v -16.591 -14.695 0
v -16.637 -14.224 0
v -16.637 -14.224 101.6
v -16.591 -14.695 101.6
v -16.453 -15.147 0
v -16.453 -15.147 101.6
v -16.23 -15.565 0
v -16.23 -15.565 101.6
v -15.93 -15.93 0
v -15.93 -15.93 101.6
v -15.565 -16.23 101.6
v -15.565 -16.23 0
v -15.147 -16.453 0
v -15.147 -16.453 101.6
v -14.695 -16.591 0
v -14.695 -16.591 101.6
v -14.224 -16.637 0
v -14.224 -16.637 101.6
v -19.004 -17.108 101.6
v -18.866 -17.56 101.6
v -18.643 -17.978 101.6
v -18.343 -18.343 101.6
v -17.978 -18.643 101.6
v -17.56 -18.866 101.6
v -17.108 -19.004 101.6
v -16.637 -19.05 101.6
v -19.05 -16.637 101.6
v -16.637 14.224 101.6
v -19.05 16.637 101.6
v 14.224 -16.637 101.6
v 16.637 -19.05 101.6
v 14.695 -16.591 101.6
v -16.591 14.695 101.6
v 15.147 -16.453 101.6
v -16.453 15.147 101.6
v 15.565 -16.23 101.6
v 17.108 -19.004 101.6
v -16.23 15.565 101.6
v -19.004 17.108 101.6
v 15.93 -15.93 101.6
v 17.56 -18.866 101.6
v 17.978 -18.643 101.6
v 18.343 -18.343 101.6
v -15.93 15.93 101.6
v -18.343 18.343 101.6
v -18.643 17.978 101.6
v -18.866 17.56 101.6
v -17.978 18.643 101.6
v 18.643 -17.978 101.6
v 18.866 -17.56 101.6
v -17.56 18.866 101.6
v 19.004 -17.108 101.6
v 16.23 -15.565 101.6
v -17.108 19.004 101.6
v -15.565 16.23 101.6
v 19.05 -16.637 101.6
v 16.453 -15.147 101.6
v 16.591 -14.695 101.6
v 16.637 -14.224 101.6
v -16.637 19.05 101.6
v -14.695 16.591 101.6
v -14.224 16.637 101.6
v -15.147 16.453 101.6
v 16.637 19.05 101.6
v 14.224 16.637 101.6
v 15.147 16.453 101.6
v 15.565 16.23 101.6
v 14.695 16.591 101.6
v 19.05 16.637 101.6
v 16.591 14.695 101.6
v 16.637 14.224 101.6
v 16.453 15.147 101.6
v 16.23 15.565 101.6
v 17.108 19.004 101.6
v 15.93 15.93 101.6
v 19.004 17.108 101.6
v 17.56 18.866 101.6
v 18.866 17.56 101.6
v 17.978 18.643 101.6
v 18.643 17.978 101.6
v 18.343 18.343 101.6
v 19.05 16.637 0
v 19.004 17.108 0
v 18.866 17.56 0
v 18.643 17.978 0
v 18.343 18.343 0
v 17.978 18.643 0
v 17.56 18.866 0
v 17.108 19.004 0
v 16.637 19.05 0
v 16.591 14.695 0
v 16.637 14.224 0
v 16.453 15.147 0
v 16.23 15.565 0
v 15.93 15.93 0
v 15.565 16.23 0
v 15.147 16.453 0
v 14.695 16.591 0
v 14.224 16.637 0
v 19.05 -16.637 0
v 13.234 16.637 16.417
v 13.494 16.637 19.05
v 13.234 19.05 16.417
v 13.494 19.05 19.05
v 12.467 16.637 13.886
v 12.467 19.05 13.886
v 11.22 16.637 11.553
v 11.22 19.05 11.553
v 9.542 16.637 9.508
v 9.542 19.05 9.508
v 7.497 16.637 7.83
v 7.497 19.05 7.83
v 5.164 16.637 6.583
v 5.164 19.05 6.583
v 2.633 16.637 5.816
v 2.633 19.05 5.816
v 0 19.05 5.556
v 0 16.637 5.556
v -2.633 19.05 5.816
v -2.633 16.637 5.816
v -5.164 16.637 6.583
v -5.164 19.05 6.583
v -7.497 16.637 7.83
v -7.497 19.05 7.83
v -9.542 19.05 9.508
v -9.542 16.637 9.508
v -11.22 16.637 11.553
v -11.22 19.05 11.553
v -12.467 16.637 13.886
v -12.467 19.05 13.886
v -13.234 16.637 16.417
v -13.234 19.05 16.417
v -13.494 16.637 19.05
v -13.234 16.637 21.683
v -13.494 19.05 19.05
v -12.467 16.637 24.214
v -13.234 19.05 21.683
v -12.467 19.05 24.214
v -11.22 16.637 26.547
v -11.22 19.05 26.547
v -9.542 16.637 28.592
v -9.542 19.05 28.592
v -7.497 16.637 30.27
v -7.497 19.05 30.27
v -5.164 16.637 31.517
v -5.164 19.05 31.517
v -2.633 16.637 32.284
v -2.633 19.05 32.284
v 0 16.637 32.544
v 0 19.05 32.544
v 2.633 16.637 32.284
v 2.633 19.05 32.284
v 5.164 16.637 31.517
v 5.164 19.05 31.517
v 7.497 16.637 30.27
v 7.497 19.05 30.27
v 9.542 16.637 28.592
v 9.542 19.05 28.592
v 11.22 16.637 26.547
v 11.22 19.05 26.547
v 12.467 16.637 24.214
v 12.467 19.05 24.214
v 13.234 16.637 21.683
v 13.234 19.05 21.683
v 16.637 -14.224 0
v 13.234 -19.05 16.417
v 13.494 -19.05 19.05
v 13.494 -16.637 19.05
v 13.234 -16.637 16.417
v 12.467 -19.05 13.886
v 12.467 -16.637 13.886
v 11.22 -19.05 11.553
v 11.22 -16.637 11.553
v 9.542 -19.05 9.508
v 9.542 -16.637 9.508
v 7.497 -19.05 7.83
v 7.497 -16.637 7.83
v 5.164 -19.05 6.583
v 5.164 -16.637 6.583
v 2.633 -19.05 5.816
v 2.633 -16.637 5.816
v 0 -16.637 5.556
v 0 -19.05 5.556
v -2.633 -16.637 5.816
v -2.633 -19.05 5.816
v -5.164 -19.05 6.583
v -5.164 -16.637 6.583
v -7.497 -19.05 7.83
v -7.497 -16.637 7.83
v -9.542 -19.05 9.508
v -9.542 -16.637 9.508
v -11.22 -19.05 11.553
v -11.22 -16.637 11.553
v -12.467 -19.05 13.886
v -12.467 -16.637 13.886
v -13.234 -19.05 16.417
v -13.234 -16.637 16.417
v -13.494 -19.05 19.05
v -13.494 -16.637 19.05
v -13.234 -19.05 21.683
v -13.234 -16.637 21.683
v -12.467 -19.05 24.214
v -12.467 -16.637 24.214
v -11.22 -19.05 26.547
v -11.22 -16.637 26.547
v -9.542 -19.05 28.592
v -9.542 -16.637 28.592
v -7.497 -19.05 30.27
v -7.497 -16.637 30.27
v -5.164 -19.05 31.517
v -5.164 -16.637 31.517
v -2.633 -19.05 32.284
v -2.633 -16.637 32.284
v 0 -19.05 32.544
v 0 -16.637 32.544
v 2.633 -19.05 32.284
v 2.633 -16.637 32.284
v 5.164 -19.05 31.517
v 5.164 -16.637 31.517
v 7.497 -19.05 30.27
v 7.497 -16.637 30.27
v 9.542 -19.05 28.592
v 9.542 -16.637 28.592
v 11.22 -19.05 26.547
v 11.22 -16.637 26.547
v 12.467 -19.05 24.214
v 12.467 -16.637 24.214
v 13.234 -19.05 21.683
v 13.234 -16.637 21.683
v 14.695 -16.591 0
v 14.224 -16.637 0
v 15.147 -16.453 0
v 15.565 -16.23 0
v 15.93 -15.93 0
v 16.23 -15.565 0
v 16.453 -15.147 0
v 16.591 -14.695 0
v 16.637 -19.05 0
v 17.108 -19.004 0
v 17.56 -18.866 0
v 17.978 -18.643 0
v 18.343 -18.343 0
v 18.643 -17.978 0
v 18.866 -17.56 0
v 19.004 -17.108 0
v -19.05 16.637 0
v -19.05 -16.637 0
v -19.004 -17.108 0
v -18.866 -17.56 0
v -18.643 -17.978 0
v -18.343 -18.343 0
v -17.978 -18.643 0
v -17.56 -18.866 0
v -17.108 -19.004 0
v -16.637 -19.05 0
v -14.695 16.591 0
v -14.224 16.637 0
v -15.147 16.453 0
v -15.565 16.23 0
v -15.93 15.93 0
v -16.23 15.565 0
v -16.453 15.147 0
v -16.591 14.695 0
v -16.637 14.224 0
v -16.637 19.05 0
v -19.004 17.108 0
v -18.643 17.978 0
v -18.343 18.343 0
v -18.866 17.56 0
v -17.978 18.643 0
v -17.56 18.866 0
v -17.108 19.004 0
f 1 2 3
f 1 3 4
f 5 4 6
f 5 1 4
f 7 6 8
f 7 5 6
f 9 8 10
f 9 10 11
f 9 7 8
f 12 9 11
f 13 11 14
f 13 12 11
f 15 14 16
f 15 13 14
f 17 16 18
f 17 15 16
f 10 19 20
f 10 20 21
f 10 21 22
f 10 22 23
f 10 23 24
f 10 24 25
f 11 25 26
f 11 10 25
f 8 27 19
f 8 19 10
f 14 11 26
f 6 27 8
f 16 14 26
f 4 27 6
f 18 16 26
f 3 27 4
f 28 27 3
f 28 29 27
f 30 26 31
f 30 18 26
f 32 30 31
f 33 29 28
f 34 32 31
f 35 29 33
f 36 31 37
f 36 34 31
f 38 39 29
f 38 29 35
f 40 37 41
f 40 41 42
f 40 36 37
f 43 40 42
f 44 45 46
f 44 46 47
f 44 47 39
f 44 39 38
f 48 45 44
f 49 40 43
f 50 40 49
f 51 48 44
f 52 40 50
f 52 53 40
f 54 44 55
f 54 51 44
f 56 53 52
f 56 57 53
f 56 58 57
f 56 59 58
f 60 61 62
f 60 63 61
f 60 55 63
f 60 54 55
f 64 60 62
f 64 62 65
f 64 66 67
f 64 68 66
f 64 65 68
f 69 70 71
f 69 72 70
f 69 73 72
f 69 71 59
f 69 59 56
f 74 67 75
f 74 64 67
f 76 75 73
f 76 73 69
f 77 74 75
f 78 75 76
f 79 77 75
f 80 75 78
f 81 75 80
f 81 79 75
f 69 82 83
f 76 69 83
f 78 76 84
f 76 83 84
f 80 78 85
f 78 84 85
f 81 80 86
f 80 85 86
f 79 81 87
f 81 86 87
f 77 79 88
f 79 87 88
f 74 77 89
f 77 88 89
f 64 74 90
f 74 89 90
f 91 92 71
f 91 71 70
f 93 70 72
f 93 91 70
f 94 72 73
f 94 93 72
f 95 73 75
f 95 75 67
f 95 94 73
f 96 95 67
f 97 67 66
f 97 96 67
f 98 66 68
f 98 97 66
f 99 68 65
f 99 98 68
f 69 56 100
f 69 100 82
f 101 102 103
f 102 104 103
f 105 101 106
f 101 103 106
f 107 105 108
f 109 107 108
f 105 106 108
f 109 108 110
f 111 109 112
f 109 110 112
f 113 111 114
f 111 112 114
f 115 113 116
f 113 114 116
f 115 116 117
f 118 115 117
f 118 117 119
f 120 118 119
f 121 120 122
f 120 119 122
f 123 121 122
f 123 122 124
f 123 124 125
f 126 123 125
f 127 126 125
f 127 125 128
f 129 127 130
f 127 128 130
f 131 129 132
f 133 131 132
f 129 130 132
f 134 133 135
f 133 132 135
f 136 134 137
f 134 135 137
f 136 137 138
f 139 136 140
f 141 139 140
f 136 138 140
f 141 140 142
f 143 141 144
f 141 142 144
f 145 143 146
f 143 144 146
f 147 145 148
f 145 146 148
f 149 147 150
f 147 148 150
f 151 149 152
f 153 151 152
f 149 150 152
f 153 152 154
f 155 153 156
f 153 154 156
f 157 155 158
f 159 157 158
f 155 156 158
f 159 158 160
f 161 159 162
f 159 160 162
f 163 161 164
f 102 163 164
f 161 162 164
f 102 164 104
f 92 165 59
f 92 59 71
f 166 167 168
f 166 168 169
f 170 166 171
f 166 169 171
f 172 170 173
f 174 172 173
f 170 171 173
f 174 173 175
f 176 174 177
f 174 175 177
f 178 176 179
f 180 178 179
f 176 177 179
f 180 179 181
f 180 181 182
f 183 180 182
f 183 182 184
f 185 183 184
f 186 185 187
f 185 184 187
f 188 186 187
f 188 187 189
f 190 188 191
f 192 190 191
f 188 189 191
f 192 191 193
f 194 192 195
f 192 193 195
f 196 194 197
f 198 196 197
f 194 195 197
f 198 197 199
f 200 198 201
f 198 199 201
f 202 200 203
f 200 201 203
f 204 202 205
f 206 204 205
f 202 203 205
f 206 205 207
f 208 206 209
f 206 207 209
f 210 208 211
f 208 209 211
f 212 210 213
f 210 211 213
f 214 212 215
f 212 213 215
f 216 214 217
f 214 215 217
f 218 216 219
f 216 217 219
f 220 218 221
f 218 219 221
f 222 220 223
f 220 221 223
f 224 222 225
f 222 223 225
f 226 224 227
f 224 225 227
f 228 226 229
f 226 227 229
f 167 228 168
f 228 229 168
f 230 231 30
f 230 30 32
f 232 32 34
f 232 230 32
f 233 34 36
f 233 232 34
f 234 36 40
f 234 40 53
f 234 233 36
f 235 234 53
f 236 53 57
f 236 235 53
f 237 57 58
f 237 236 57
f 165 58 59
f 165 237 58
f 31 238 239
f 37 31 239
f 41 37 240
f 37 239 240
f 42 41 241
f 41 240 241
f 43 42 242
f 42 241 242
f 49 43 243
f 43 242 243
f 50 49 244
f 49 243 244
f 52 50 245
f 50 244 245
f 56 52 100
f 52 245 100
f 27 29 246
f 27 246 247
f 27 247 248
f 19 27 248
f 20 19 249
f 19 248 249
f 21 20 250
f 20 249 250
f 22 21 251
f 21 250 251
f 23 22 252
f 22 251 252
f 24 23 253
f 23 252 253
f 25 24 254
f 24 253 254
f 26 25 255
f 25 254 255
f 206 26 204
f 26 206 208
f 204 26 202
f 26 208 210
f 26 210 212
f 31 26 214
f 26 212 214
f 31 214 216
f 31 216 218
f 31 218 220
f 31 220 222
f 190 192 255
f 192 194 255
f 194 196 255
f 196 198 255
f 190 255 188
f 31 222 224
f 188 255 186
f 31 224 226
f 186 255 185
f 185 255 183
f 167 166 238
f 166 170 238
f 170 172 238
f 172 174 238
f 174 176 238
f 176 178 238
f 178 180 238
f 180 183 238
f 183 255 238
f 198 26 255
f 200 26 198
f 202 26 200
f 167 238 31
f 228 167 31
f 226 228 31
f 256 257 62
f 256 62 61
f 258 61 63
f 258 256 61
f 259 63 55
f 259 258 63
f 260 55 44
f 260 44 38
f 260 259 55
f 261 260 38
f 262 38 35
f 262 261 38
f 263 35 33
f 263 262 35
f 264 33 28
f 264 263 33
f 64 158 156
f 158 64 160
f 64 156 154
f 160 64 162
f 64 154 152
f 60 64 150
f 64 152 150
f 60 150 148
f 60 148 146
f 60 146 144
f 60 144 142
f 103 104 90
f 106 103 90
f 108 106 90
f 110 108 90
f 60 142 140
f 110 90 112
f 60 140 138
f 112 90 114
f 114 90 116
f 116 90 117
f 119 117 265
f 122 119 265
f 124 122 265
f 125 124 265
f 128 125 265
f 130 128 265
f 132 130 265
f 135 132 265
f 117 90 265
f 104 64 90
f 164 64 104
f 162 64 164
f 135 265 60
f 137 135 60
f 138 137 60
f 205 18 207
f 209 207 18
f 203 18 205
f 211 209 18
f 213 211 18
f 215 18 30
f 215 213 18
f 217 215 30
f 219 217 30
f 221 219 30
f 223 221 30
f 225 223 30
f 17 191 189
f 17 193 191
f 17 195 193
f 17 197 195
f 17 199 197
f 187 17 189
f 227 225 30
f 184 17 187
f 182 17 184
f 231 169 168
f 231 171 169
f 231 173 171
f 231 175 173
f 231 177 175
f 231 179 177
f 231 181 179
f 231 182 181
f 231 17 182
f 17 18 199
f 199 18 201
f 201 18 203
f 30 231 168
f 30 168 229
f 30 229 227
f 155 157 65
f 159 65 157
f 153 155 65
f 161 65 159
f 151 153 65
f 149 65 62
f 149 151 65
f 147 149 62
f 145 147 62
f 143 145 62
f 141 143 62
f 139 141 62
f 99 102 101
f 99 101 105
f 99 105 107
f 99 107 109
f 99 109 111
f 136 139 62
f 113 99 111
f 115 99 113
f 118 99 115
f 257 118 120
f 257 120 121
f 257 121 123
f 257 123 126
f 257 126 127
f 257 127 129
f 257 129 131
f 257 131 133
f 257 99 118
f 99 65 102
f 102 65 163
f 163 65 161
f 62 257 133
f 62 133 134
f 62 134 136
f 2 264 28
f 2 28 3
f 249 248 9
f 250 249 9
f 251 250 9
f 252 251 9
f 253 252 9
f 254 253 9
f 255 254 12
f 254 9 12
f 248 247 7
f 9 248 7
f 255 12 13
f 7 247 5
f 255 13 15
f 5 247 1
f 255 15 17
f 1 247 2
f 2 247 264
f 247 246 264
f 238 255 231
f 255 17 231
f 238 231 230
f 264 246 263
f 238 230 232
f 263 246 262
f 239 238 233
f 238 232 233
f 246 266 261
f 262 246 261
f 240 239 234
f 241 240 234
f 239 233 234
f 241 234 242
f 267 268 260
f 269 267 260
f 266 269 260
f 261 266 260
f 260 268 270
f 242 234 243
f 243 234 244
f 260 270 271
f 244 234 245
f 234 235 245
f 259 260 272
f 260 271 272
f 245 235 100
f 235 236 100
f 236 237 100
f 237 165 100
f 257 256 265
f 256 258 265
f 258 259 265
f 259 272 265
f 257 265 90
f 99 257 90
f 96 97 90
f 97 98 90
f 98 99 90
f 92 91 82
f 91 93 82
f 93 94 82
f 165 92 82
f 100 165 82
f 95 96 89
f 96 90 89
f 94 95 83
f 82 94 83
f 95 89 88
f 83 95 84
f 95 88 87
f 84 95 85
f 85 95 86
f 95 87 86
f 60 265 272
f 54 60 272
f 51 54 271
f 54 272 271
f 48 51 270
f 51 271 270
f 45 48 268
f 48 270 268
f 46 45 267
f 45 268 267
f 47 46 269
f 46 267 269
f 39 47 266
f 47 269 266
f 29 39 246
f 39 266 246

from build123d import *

# Parameters (mm, degrees)
BOSS_EXTRUDE1_DEPTH = 101.6
SKETCH2_R           = 13.49375
CUT_EXTRUDE1_DEPTH  = 228.6


with BuildPart() as part:
    # Sketch1 → Boss-Extrude1 (new body)
    with BuildSketch(Plane.XY):
        with BuildLine():
            Line((-16.637, -19.05), (16.637, -19.05))
            ThreePointArc((16.637, -19.05), (18.343248663, -18.343248663), (19.05, -16.637))
            Line((19.05, -16.637), (19.05, 16.637))
            ThreePointArc((19.05, 16.637), (18.343248663, 18.343248663), (16.637, 19.05))
            Line((16.637, 19.05), (-16.637, 19.05))
            ThreePointArc((-16.637, 19.05), (-18.343248663, 18.343248663), (-19.05, 16.637))
            Line((-19.05, 16.637), (-19.05, -16.637))
            ThreePointArc((-19.05, -16.637), (-18.343248663, -18.343248663), (-16.637, -19.05))
        make_face()
        with BuildLine():
            Line((-14.224, -16.637), (14.224, -16.637))
            ThreePointArc((14.224, -16.637), (15.930248663, -15.930248663), (16.637, -14.224))
            Line((16.637, -14.224), (16.637, 14.224))
            ThreePointArc((16.637, 14.224), (15.930248663, 15.930248663), (14.224, 16.637))
            Line((14.224, 16.637), (-14.224, 16.637))
            ThreePointArc((-14.224, 16.637), (-15.930248663, 15.930248663), (-16.637, 14.224))
            Line((-16.637, 14.224), (-16.637, -14.224))
            ThreePointArc((-16.637, -14.224), (-15.930248663, -15.930248663), (-14.224, -16.637))
        make_face(mode=Mode.SUBTRACT)
    extrude(amount=BOSS_EXTRUDE1_DEPTH)

    # Sketch2 → Cut-Extrude1 (cut, symmetric)
    with BuildSketch(Plane(origin=(0, 0, 0), x_dir=(1, 0, 0), z_dir=(0, 1, 0))):
        with Locations((0, -19.05)):
            Circle(SKETCH2_R)
    extrude(amount=CUT_EXTRUDE1_DEPTH, both=True, mode=Mode.SUBTRACT)


solid = part.part
